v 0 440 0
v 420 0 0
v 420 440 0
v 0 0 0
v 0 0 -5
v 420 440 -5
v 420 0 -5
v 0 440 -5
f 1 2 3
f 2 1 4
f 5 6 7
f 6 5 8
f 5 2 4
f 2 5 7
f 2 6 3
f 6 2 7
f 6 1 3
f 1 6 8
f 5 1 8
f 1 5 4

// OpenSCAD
// use <bolt.scad> 

module workroom()
{
    room_length = 420;
    room_width = 440;
    
    // Floor
    floor_thickness = 5;
    translate([0,0,-floor_thickness])
    color([0.9,0.9,0.75, 1.0])
    cube([room_length, room_width, floor_thickness]);
}        

workroom();
